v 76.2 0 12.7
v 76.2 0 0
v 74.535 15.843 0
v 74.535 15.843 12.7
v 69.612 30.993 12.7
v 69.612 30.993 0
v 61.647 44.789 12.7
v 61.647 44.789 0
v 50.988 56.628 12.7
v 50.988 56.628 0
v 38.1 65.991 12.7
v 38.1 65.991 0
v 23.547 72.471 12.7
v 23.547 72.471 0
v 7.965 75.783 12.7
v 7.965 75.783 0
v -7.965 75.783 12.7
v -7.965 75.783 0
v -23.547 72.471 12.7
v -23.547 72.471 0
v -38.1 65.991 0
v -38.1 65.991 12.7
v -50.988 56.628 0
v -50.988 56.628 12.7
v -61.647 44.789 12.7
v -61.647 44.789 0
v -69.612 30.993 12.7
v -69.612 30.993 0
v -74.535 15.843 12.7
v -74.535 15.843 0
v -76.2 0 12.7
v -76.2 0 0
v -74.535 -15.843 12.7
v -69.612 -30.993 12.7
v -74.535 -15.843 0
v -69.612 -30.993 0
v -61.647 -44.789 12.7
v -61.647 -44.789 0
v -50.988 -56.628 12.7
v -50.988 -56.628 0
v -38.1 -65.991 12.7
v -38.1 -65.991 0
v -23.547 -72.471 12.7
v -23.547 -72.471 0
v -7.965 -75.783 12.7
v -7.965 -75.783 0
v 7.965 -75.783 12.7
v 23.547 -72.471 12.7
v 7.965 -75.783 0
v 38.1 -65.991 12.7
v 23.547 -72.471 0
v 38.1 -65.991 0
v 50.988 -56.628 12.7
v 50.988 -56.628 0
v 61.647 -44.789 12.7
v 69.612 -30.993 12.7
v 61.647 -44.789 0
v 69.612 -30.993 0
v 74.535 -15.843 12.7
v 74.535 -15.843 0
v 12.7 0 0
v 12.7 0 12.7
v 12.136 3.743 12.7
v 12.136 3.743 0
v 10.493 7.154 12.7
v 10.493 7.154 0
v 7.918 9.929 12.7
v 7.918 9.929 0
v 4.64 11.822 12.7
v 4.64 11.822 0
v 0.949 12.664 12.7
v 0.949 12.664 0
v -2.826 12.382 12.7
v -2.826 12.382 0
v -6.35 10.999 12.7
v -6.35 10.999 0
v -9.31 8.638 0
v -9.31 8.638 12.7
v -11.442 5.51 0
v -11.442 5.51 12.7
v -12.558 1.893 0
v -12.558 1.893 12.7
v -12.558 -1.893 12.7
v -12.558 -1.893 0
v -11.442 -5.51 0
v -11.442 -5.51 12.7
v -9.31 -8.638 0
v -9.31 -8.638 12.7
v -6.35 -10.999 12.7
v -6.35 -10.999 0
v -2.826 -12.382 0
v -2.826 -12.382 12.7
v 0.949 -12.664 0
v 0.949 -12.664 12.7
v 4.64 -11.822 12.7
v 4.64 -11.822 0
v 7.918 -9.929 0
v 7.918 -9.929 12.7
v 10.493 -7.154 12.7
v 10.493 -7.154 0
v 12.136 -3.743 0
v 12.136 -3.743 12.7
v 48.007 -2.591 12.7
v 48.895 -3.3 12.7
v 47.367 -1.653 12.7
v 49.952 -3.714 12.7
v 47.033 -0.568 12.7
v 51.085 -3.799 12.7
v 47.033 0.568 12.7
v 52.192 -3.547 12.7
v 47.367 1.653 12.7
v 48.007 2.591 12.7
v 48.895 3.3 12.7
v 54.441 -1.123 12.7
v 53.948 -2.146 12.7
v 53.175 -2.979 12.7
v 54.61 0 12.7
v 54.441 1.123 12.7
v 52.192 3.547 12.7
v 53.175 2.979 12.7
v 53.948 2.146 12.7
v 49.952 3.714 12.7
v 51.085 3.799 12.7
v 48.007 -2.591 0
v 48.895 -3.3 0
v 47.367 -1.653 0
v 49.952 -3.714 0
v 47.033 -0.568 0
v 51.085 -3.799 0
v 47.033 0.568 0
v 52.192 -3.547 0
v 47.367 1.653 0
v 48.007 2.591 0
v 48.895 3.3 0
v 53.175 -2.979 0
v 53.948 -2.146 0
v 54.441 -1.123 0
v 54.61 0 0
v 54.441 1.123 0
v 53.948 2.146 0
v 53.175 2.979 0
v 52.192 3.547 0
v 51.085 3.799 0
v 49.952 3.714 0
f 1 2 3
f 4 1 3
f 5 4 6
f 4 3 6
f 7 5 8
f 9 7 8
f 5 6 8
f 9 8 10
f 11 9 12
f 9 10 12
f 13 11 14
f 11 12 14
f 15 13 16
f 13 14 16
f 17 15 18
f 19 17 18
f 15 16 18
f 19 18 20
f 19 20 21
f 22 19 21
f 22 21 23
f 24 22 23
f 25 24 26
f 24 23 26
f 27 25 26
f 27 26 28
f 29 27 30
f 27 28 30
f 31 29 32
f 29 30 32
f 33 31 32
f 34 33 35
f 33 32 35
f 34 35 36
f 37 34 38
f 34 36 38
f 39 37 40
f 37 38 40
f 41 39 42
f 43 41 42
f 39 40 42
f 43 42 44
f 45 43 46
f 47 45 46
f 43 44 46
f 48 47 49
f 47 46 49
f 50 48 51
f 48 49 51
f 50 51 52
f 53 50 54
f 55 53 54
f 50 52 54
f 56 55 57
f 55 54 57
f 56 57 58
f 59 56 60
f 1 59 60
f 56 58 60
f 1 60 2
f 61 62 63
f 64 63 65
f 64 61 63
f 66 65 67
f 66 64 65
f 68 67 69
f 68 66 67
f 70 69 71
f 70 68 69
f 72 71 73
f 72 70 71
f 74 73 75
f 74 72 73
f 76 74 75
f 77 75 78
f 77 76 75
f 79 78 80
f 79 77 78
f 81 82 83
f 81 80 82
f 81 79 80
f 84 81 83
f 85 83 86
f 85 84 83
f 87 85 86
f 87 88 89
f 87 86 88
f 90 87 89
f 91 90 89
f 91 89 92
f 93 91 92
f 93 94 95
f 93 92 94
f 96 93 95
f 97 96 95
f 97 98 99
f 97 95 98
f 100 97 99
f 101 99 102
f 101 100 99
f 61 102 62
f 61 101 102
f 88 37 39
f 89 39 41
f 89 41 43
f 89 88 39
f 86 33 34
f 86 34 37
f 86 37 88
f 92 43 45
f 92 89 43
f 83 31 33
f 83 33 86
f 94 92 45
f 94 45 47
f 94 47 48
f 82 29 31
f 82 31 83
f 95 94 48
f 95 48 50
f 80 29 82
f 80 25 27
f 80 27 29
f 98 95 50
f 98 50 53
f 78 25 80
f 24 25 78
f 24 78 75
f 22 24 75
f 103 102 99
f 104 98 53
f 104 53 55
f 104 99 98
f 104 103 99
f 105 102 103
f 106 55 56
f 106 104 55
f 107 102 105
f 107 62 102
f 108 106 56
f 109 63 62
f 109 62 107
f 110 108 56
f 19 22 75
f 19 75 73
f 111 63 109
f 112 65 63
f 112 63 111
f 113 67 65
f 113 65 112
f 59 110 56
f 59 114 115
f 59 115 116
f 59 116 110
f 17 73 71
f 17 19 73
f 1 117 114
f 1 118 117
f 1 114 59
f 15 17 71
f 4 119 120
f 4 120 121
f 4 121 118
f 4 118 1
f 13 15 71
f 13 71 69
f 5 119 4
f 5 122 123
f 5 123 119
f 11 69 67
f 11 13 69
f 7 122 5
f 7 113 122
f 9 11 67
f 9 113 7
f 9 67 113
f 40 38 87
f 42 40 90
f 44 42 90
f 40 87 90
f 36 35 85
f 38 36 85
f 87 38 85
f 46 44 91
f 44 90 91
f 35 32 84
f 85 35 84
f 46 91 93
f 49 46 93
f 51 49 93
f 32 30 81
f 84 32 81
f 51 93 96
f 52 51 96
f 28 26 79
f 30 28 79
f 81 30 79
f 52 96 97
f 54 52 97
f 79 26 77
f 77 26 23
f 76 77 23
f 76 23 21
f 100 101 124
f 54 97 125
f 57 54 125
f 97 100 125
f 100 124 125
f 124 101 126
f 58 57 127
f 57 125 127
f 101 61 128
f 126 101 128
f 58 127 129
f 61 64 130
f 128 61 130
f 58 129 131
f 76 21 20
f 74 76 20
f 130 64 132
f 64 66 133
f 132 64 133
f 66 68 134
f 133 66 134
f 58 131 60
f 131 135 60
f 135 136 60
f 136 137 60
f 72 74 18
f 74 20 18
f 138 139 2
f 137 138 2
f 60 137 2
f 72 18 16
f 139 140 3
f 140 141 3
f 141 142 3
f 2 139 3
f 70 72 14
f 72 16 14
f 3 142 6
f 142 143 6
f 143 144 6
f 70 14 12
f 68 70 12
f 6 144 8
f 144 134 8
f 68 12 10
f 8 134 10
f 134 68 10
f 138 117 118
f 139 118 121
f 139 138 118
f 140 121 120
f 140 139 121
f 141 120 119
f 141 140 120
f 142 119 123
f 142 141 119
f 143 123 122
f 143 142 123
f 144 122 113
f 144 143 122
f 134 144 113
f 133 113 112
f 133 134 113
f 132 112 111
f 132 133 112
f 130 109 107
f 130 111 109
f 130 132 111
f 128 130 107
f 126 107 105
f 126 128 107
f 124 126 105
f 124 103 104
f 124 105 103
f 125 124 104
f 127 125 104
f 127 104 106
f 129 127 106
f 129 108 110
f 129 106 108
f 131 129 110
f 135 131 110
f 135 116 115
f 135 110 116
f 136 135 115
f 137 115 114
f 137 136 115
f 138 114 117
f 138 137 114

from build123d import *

# Parameters (mm, degrees)
SKETCH1_R         = 76.2
ROUND_PLATE_DEPTH = 12.7
SKETCH2_R         = 12.7
CENTRE_BORE_DEPTH = 109.508847566
SKETCH3_R         = 3.81
SEED_HOLE_DEPTH   = 109.508847566


with BuildPart() as part:
    # Sketch1 → round_plate (new body)
    with BuildSketch(Plane.XY):
        Circle(SKETCH1_R)
    extrude(amount=ROUND_PLATE_DEPTH)

    # Sketch2 → centre_bore (cut, through all)
    with BuildSketch(Plane.XY):
        Circle(SKETCH2_R)
    extrude(amount=CENTRE_BORE_DEPTH, mode=Mode.SUBTRACT)

    # Sketch3 → seed_hole (cut, through all)
    with BuildSketch(Plane.XY):
        with Locations((50.8, 0)):
            Circle(SKETCH3_R)
    extrude(amount=SEED_HOLE_DEPTH, mode=Mode.SUBTRACT)


solid = part.part
